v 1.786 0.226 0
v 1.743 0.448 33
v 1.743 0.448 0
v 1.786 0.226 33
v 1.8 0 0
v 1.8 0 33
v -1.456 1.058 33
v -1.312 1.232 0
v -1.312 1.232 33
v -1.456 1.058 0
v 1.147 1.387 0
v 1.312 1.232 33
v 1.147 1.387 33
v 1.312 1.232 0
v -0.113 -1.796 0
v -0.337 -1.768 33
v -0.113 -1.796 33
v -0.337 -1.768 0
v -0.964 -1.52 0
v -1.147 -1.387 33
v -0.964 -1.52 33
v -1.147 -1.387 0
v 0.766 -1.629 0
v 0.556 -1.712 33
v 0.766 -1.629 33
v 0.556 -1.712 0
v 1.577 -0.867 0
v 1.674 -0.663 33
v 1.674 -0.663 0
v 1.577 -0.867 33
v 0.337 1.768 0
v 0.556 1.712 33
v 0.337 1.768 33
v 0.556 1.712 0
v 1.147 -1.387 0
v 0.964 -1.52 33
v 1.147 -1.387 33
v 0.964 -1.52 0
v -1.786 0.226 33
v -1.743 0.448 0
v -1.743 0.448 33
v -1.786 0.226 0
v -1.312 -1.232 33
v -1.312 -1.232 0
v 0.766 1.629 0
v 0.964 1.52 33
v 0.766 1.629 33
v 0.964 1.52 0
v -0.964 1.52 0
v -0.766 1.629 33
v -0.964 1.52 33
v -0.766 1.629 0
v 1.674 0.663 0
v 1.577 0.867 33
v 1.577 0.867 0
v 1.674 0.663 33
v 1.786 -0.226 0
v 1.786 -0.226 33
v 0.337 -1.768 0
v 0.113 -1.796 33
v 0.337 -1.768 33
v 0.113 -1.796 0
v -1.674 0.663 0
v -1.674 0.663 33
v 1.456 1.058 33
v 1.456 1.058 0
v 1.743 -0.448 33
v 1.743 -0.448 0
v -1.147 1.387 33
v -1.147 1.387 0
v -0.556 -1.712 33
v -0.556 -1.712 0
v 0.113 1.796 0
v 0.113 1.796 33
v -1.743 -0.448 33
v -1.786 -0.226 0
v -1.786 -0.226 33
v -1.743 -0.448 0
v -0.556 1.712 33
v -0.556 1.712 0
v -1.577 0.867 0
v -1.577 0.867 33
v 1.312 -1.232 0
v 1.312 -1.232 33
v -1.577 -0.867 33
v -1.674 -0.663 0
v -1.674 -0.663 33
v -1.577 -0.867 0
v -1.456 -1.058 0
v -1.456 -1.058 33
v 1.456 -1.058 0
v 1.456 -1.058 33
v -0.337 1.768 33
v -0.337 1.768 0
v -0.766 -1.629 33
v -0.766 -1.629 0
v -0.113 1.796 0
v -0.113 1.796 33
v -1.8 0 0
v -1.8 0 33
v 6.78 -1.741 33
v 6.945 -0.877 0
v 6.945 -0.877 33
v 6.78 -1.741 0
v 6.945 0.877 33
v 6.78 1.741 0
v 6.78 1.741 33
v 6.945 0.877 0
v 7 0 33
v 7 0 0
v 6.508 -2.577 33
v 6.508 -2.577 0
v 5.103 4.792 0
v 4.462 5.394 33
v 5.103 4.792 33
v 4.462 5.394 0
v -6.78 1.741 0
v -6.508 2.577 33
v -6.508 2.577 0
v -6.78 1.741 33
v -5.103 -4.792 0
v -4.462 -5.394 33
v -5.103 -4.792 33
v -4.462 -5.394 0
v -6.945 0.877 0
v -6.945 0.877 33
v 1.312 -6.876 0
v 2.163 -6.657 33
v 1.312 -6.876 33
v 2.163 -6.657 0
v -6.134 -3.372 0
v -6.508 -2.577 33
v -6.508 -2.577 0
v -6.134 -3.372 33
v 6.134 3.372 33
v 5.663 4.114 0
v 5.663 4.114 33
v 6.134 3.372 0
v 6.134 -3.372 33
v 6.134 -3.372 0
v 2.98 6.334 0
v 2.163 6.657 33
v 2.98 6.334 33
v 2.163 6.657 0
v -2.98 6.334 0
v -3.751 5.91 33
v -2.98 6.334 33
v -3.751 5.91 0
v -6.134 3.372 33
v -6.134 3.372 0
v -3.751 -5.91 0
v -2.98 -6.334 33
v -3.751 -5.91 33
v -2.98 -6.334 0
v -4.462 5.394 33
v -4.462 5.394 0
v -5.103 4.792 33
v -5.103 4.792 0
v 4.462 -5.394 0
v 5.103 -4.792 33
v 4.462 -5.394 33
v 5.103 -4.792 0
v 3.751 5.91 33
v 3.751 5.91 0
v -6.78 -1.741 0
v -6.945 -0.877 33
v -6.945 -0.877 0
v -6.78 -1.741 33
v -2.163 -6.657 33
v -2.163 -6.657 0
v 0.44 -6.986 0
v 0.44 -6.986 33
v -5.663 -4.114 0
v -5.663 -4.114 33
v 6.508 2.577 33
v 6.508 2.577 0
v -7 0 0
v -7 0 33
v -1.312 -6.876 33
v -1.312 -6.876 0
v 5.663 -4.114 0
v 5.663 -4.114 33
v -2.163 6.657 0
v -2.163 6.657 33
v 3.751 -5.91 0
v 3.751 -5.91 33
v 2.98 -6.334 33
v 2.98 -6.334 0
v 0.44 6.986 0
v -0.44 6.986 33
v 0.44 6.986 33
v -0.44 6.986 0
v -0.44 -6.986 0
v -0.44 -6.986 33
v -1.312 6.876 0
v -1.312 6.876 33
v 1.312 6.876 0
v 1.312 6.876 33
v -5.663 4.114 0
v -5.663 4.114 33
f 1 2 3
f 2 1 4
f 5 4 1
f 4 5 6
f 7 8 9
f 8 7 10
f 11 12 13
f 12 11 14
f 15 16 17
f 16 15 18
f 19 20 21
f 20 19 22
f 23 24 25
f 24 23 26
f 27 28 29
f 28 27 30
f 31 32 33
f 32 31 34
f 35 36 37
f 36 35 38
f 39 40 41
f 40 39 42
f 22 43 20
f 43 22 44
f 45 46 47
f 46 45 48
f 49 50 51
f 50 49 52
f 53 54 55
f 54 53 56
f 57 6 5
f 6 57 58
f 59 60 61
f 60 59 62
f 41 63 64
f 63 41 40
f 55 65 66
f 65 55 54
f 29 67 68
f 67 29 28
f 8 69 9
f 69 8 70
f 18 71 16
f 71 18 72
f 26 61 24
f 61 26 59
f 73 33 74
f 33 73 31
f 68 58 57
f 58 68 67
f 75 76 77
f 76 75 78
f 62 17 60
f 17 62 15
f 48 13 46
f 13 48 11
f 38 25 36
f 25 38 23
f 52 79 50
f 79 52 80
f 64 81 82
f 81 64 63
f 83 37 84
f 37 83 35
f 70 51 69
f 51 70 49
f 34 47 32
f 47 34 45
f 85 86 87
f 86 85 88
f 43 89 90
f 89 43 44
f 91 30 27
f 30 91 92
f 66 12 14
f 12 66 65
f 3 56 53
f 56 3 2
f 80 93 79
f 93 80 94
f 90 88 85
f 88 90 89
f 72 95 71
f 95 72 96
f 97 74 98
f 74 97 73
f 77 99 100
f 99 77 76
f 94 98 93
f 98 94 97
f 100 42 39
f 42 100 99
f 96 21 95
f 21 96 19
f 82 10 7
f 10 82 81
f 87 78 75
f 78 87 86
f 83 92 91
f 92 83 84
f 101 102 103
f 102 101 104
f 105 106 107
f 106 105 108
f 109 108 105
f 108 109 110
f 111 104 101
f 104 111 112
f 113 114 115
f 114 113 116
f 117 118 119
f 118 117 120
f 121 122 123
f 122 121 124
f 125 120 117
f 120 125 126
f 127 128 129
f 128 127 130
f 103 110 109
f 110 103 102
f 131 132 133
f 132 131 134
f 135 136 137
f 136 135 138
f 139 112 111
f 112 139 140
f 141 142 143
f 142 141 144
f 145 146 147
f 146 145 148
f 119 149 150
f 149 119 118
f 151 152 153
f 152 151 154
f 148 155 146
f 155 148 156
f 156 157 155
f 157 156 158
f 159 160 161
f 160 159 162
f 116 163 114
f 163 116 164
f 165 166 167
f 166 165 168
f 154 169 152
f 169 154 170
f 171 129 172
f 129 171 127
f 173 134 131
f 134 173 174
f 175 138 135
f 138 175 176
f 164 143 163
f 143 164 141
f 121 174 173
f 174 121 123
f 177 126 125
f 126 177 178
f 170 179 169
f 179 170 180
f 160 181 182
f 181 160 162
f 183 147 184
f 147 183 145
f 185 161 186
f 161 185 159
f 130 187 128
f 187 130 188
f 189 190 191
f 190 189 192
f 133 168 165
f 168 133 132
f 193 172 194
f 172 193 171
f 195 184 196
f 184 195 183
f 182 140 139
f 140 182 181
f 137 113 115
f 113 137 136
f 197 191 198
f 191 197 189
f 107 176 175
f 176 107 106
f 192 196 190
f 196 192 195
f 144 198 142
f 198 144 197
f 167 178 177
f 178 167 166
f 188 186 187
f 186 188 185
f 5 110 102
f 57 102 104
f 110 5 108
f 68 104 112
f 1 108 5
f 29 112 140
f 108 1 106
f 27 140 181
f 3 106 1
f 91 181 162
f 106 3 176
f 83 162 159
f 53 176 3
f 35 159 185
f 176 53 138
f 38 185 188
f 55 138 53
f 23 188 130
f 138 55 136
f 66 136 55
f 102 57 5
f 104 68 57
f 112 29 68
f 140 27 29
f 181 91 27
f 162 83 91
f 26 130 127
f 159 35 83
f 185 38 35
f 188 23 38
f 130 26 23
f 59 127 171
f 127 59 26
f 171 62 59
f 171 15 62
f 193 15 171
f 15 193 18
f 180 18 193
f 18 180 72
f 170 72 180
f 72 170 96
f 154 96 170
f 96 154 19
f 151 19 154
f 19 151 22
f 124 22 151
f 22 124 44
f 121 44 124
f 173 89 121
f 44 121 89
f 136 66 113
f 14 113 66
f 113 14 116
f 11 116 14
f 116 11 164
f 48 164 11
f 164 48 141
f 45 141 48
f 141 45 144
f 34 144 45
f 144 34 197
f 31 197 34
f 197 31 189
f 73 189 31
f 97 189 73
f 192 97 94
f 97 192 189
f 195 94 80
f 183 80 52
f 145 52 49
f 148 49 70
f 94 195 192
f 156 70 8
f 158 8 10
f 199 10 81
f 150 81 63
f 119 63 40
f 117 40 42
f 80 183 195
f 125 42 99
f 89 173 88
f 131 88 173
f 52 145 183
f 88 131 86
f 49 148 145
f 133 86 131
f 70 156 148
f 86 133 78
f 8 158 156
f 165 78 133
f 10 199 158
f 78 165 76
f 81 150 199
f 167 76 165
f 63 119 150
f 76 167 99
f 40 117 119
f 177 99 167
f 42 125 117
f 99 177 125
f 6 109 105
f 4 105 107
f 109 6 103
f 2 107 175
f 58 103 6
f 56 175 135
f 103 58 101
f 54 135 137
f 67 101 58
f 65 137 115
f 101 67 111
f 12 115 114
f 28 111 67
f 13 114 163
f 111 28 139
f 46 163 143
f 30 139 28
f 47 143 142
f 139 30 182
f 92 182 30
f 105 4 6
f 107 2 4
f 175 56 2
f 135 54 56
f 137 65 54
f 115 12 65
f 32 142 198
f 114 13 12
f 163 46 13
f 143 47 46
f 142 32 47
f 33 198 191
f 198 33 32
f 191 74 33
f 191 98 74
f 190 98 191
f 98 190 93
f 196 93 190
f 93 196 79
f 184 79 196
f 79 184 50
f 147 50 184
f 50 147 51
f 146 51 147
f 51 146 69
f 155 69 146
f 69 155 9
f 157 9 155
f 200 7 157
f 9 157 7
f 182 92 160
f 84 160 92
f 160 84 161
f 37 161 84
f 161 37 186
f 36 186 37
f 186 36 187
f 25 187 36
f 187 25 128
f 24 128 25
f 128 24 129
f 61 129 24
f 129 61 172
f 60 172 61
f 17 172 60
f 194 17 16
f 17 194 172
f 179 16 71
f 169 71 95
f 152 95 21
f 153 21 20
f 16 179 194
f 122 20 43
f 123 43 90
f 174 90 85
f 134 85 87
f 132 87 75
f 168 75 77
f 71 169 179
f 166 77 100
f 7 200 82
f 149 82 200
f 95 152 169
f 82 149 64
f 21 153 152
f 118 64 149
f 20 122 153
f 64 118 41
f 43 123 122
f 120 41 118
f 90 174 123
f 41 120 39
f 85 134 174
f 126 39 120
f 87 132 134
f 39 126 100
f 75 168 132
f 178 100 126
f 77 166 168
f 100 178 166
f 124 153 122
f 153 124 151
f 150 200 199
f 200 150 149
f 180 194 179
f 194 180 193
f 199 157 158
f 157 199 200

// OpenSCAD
$fn = 50;


difference() {
	union() {
		cylinder(h = 33, r = 7.0000000000);
	}
	union() {
		translate(v = [0.0000000000, 0.0000000000, -100.0000000000]) {
			cylinder(h = 200, r = 1.8000000000);
		}
		cylinder(h = 33, r = 1.8000000000);
		cylinder(h = 33, r = 1.8000000000);
		cylinder(h = 33, r = 1.8000000000);
	}
}
